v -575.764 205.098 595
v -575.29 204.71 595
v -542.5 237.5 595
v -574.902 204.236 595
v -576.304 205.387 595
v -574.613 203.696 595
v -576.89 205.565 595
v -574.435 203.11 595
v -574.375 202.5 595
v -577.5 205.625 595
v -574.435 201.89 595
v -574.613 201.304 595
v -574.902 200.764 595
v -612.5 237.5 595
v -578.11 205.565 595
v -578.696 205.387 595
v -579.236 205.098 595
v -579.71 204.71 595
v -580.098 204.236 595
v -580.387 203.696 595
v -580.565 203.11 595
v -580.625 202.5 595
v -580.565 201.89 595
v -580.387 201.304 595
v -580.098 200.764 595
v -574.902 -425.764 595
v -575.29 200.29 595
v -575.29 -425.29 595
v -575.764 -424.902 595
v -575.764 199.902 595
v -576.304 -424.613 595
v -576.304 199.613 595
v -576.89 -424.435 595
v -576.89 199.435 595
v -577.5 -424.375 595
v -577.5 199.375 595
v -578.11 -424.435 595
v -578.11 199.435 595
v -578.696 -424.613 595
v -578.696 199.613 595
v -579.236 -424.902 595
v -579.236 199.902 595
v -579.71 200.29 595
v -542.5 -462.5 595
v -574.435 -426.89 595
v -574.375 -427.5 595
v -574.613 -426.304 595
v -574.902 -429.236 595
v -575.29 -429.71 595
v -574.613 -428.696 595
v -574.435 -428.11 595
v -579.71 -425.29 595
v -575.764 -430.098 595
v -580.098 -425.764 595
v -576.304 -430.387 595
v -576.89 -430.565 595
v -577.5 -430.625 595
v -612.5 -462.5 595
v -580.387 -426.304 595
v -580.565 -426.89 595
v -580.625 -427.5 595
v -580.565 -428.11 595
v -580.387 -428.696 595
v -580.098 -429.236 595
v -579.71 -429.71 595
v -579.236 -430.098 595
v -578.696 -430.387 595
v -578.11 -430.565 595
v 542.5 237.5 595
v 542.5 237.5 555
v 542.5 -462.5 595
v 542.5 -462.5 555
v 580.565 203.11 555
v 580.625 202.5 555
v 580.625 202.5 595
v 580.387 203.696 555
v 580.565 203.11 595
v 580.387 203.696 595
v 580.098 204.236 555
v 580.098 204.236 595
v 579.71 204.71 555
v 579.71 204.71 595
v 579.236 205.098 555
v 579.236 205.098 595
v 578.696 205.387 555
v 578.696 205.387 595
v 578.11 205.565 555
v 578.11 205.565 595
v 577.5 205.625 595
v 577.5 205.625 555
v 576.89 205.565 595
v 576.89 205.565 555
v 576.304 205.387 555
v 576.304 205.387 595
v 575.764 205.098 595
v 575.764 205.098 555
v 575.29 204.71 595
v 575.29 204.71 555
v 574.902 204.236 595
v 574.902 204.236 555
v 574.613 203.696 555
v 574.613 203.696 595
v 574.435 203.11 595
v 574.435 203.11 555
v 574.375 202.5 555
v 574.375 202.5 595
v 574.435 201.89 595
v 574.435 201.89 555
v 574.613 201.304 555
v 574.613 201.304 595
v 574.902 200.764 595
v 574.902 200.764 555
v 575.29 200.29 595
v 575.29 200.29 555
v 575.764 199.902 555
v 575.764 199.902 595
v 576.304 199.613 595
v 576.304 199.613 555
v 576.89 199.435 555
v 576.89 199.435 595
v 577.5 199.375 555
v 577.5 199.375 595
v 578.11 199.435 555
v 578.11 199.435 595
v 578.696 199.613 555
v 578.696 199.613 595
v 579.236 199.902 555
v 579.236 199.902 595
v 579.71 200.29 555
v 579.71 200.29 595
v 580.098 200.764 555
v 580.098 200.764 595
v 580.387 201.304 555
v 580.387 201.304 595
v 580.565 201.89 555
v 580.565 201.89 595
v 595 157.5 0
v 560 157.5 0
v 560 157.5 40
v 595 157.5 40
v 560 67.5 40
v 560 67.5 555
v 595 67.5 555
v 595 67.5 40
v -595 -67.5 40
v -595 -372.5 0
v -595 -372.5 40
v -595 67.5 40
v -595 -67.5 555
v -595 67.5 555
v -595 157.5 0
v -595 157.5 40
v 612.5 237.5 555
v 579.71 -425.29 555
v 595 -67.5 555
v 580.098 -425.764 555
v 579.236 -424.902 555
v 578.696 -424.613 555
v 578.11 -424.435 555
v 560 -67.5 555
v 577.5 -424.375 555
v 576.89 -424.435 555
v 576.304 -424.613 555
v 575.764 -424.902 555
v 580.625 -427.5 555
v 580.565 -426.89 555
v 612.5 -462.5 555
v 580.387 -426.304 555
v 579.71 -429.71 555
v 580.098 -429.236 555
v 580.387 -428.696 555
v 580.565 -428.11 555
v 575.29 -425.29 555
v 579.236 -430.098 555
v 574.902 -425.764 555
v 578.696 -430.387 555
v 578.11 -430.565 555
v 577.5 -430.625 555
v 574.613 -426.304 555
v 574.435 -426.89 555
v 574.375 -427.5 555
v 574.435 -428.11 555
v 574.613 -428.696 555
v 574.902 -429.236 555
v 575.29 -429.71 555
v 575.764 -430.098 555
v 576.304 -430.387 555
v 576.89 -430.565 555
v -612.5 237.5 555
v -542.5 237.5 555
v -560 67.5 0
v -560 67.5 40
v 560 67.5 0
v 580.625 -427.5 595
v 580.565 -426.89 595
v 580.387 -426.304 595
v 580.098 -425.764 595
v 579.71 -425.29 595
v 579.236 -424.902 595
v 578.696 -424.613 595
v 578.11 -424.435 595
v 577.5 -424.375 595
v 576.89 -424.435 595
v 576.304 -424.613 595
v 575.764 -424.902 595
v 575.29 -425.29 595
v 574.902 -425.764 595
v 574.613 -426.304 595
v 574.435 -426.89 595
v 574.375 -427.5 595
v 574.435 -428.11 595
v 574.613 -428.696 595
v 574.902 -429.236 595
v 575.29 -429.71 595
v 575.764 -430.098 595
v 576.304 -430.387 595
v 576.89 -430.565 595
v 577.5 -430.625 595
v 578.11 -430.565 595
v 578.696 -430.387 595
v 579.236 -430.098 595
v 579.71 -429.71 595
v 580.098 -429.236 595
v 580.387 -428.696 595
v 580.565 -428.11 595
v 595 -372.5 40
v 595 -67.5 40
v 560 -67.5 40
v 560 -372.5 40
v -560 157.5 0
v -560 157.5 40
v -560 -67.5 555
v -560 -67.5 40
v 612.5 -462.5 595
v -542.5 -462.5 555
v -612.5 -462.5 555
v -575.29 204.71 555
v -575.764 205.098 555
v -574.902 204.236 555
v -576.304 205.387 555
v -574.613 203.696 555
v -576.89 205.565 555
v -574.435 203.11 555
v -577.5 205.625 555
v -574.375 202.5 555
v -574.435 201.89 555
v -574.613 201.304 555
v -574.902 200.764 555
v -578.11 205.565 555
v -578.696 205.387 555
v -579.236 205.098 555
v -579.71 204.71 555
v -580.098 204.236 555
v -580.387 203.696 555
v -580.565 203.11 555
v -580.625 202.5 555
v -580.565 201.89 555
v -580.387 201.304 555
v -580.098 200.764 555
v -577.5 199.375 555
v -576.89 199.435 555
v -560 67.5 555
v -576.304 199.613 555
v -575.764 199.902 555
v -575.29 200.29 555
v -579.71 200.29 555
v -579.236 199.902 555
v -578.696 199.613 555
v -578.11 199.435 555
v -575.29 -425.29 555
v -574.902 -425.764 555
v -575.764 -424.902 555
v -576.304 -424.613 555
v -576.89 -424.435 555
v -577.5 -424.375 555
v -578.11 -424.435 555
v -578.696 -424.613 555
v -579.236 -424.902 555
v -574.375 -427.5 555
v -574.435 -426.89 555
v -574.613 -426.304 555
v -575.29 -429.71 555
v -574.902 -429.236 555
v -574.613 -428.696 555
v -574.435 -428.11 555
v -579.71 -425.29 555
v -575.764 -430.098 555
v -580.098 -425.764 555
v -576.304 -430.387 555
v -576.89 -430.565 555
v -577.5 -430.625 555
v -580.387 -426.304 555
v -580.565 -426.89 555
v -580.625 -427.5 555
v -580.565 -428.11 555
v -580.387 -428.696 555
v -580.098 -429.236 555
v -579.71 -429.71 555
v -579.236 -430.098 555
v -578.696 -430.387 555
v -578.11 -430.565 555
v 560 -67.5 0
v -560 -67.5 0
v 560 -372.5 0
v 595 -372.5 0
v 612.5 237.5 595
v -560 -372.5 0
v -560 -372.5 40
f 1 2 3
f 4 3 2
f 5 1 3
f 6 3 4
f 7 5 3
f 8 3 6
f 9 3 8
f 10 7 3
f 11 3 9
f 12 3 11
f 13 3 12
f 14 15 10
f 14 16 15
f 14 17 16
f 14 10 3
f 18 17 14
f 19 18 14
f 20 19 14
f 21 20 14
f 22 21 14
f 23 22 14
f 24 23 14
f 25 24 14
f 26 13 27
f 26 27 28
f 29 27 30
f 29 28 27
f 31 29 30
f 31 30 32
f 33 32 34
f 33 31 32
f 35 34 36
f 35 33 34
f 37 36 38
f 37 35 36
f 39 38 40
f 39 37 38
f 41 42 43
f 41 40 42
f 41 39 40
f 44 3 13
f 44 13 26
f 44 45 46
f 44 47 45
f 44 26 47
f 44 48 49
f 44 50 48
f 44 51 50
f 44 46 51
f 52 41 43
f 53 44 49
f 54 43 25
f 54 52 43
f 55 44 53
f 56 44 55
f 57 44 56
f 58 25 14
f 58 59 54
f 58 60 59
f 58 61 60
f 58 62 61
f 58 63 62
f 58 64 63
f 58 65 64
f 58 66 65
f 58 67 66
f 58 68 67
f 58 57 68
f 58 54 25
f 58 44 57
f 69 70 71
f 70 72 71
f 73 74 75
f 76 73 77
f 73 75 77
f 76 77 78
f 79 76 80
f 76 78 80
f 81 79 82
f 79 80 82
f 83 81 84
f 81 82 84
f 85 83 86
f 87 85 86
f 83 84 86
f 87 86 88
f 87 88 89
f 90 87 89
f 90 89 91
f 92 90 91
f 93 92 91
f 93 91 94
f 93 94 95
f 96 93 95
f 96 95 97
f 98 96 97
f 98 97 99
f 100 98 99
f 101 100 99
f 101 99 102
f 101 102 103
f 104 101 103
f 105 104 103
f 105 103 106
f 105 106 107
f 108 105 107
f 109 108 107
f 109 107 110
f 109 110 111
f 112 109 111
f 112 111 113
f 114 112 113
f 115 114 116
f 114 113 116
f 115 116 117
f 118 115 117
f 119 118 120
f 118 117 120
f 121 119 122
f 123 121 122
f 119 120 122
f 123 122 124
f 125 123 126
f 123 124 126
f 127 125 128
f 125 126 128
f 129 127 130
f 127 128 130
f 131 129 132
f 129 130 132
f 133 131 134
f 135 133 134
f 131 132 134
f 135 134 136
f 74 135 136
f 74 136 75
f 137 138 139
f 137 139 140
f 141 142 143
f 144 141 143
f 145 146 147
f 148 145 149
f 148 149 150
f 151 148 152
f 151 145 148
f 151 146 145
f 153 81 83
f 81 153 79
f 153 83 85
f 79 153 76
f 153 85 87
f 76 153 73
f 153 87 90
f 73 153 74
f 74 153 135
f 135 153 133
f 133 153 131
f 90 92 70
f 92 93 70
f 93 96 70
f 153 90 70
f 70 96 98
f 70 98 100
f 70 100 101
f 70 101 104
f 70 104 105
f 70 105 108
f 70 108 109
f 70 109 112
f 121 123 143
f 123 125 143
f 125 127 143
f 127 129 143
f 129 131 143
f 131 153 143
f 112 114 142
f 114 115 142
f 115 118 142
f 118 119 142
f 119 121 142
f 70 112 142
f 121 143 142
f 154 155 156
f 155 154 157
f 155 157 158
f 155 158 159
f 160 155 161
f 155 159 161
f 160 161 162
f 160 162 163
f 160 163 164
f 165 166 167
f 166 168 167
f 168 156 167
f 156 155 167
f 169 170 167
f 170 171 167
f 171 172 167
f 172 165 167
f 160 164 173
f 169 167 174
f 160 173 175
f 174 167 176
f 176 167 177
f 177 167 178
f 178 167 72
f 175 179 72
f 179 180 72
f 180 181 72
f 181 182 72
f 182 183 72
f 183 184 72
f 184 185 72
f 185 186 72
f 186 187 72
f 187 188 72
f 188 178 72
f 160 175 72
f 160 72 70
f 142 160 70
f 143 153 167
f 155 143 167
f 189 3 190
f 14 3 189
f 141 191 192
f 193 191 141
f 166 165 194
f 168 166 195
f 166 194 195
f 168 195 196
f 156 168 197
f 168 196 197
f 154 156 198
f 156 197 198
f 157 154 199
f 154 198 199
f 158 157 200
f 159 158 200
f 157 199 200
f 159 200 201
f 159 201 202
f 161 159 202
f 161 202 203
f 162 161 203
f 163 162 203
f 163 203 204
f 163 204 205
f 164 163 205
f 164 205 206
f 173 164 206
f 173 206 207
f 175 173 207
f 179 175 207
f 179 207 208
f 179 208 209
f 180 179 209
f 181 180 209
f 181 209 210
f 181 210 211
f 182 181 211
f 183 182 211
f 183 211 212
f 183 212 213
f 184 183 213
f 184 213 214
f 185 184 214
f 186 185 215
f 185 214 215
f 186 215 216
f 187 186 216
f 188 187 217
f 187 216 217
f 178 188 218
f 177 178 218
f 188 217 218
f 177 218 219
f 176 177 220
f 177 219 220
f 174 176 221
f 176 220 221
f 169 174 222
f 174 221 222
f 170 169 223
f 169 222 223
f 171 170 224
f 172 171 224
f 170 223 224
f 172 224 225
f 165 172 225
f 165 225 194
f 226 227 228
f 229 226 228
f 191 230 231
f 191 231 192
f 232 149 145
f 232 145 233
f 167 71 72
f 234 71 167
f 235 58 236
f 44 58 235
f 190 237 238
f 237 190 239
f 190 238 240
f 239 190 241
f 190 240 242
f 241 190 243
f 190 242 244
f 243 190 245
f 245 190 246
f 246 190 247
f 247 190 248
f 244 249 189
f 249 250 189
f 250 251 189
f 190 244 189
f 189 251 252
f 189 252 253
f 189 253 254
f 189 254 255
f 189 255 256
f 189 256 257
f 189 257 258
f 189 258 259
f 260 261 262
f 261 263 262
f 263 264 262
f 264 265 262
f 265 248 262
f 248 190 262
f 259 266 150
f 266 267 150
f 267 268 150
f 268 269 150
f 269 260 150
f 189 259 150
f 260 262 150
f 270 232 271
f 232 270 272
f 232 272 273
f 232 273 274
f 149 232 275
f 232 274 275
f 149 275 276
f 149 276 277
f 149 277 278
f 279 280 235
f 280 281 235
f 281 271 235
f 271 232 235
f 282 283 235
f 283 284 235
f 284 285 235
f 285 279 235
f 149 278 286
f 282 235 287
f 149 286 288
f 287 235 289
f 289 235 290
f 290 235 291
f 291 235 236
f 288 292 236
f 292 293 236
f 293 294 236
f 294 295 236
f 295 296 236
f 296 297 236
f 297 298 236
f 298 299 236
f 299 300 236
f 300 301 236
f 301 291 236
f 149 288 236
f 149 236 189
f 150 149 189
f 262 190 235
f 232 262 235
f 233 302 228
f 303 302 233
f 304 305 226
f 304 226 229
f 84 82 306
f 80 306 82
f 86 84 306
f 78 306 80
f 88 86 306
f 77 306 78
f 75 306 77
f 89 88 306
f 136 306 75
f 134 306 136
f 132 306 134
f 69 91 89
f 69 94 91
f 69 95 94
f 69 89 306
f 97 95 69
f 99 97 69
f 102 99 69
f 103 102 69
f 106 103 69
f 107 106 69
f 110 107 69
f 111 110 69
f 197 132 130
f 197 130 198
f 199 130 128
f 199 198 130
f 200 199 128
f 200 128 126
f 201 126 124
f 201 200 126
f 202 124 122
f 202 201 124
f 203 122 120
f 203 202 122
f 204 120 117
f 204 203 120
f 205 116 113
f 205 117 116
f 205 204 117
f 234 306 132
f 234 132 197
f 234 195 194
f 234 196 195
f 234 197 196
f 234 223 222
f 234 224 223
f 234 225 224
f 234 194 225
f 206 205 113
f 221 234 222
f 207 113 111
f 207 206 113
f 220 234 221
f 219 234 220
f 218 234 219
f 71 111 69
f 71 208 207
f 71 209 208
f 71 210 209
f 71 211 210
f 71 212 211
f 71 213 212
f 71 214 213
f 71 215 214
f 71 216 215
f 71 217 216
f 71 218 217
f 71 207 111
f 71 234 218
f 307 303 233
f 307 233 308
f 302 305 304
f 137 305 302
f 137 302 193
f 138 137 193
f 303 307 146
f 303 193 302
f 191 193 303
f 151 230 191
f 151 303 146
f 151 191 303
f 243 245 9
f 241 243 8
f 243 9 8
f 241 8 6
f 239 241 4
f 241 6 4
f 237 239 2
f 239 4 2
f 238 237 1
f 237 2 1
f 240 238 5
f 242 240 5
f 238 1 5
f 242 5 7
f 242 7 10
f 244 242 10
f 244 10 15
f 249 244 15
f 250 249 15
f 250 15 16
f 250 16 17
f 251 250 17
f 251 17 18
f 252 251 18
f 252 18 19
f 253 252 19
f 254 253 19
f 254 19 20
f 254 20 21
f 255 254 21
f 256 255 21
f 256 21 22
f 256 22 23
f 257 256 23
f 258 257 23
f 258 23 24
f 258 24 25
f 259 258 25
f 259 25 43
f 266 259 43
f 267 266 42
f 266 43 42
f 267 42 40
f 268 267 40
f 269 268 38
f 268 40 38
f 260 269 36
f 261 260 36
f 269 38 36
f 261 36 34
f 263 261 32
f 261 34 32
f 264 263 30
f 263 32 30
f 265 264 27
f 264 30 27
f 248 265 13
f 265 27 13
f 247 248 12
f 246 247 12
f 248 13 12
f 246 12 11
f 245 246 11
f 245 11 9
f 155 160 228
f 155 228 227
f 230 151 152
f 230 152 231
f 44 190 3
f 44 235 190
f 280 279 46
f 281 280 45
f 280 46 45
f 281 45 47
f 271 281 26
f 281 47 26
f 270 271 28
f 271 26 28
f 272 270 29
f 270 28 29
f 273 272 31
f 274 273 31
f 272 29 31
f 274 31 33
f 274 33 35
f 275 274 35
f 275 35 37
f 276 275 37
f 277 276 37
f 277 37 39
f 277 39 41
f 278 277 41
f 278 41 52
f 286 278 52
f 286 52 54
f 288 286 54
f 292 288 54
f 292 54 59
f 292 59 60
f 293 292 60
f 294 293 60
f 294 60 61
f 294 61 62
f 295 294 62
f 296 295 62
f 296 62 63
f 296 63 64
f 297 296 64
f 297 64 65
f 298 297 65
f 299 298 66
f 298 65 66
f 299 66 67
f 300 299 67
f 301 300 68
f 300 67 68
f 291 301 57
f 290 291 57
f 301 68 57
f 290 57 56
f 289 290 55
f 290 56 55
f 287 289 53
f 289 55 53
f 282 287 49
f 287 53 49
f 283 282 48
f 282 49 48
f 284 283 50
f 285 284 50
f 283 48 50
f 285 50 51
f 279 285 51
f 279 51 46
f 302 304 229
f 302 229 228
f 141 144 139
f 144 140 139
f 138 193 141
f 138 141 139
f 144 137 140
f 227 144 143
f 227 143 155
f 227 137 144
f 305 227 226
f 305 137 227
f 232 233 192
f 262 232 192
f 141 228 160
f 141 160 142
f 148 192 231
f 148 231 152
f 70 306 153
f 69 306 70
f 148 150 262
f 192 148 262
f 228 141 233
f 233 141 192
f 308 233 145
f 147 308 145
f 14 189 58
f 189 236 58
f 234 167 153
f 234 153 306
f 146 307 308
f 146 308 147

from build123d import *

# Parameters (mm, degrees)
PAD_DEPTH    = 40
SKETCH001_W  = 35
SKETCH001_H  = 135
PAD001_DEPTH = 555
SKETCH002_W  = 70
SKETCH002_H  = 40
PAD002_DEPTH = 395
SKETCH003_W  = 70
SKETCH003_H  = 40
PAD003_DEPTH = 305
SKETCH004_R  = 3.125
POCKET_DEPTH = 595.001


with BuildPart() as part:
    # Sketch → Pad (new body)
    with BuildSketch(Plane.XY):
        Polygon((-560, 67.5), (560, 67.5), (560, 157.5), (595, 157.5), (595, -372.5), (560, -372.5), (560, -67.5), (-560, -67.5), (-560, -372.5), (-595, -372.5), (-595, 157.5), (-560, 157.5), align=None)
    extrude(amount=PAD_DEPTH)

    # Sketch001 (on Face14 of Pad) → Pad001 (join)
    with BuildSketch(Plane.XY.offset(40)):
        with Locations((-577.5, 0)):
            Rectangle(SKETCH001_W, SKETCH001_H)
        with Locations((577.5, 0)):
            Rectangle(SKETCH001_W, SKETCH001_H)
    extrude(amount=PAD001_DEPTH)

    # Sketch002 (on Face27 of Pad001) → Pad002 (join)
    with BuildSketch(Plane.XZ.offset(67.5)):
        with Locations((-577.5, 575)):
            Rectangle(SKETCH002_W, SKETCH002_H)
        with Locations((577.5, 575)):
            Rectangle(SKETCH002_W, SKETCH002_H)
    extrude(amount=PAD002_DEPTH)

    # Sketch003 (on Face32 of Pad002) → Pad003 (join)
    with BuildSketch(Plane(origin=(0, -67.5, 0), x_dir=(-1, 0, 0), z_dir=(0, 1, 0))):
        with Locations((577.5, 575)):
            Rectangle(SKETCH003_W, SKETCH003_H)
        with Locations((-577.5, 575)):
            Rectangle(SKETCH003_W, SKETCH003_H)
    extrude(amount=PAD003_DEPTH)

    # Sketch004 (on Face47 of Pad003) → Pocket (cut, through all)
    with BuildSketch(Plane.XY.offset(595)):
        with Locations((-577.5, -427.5)):
            Circle(SKETCH004_R)
        with Locations((577.5, -427.5)):
            Circle(SKETCH004_R)
        with Locations((-577.5, 202.5)):
            Circle(SKETCH004_R)
        with Locations((577.5, 202.5)):
            Circle(SKETCH004_R)
    extrude(amount=-POCKET_DEPTH, mode=Mode.SUBTRACT)


solid = part.part
